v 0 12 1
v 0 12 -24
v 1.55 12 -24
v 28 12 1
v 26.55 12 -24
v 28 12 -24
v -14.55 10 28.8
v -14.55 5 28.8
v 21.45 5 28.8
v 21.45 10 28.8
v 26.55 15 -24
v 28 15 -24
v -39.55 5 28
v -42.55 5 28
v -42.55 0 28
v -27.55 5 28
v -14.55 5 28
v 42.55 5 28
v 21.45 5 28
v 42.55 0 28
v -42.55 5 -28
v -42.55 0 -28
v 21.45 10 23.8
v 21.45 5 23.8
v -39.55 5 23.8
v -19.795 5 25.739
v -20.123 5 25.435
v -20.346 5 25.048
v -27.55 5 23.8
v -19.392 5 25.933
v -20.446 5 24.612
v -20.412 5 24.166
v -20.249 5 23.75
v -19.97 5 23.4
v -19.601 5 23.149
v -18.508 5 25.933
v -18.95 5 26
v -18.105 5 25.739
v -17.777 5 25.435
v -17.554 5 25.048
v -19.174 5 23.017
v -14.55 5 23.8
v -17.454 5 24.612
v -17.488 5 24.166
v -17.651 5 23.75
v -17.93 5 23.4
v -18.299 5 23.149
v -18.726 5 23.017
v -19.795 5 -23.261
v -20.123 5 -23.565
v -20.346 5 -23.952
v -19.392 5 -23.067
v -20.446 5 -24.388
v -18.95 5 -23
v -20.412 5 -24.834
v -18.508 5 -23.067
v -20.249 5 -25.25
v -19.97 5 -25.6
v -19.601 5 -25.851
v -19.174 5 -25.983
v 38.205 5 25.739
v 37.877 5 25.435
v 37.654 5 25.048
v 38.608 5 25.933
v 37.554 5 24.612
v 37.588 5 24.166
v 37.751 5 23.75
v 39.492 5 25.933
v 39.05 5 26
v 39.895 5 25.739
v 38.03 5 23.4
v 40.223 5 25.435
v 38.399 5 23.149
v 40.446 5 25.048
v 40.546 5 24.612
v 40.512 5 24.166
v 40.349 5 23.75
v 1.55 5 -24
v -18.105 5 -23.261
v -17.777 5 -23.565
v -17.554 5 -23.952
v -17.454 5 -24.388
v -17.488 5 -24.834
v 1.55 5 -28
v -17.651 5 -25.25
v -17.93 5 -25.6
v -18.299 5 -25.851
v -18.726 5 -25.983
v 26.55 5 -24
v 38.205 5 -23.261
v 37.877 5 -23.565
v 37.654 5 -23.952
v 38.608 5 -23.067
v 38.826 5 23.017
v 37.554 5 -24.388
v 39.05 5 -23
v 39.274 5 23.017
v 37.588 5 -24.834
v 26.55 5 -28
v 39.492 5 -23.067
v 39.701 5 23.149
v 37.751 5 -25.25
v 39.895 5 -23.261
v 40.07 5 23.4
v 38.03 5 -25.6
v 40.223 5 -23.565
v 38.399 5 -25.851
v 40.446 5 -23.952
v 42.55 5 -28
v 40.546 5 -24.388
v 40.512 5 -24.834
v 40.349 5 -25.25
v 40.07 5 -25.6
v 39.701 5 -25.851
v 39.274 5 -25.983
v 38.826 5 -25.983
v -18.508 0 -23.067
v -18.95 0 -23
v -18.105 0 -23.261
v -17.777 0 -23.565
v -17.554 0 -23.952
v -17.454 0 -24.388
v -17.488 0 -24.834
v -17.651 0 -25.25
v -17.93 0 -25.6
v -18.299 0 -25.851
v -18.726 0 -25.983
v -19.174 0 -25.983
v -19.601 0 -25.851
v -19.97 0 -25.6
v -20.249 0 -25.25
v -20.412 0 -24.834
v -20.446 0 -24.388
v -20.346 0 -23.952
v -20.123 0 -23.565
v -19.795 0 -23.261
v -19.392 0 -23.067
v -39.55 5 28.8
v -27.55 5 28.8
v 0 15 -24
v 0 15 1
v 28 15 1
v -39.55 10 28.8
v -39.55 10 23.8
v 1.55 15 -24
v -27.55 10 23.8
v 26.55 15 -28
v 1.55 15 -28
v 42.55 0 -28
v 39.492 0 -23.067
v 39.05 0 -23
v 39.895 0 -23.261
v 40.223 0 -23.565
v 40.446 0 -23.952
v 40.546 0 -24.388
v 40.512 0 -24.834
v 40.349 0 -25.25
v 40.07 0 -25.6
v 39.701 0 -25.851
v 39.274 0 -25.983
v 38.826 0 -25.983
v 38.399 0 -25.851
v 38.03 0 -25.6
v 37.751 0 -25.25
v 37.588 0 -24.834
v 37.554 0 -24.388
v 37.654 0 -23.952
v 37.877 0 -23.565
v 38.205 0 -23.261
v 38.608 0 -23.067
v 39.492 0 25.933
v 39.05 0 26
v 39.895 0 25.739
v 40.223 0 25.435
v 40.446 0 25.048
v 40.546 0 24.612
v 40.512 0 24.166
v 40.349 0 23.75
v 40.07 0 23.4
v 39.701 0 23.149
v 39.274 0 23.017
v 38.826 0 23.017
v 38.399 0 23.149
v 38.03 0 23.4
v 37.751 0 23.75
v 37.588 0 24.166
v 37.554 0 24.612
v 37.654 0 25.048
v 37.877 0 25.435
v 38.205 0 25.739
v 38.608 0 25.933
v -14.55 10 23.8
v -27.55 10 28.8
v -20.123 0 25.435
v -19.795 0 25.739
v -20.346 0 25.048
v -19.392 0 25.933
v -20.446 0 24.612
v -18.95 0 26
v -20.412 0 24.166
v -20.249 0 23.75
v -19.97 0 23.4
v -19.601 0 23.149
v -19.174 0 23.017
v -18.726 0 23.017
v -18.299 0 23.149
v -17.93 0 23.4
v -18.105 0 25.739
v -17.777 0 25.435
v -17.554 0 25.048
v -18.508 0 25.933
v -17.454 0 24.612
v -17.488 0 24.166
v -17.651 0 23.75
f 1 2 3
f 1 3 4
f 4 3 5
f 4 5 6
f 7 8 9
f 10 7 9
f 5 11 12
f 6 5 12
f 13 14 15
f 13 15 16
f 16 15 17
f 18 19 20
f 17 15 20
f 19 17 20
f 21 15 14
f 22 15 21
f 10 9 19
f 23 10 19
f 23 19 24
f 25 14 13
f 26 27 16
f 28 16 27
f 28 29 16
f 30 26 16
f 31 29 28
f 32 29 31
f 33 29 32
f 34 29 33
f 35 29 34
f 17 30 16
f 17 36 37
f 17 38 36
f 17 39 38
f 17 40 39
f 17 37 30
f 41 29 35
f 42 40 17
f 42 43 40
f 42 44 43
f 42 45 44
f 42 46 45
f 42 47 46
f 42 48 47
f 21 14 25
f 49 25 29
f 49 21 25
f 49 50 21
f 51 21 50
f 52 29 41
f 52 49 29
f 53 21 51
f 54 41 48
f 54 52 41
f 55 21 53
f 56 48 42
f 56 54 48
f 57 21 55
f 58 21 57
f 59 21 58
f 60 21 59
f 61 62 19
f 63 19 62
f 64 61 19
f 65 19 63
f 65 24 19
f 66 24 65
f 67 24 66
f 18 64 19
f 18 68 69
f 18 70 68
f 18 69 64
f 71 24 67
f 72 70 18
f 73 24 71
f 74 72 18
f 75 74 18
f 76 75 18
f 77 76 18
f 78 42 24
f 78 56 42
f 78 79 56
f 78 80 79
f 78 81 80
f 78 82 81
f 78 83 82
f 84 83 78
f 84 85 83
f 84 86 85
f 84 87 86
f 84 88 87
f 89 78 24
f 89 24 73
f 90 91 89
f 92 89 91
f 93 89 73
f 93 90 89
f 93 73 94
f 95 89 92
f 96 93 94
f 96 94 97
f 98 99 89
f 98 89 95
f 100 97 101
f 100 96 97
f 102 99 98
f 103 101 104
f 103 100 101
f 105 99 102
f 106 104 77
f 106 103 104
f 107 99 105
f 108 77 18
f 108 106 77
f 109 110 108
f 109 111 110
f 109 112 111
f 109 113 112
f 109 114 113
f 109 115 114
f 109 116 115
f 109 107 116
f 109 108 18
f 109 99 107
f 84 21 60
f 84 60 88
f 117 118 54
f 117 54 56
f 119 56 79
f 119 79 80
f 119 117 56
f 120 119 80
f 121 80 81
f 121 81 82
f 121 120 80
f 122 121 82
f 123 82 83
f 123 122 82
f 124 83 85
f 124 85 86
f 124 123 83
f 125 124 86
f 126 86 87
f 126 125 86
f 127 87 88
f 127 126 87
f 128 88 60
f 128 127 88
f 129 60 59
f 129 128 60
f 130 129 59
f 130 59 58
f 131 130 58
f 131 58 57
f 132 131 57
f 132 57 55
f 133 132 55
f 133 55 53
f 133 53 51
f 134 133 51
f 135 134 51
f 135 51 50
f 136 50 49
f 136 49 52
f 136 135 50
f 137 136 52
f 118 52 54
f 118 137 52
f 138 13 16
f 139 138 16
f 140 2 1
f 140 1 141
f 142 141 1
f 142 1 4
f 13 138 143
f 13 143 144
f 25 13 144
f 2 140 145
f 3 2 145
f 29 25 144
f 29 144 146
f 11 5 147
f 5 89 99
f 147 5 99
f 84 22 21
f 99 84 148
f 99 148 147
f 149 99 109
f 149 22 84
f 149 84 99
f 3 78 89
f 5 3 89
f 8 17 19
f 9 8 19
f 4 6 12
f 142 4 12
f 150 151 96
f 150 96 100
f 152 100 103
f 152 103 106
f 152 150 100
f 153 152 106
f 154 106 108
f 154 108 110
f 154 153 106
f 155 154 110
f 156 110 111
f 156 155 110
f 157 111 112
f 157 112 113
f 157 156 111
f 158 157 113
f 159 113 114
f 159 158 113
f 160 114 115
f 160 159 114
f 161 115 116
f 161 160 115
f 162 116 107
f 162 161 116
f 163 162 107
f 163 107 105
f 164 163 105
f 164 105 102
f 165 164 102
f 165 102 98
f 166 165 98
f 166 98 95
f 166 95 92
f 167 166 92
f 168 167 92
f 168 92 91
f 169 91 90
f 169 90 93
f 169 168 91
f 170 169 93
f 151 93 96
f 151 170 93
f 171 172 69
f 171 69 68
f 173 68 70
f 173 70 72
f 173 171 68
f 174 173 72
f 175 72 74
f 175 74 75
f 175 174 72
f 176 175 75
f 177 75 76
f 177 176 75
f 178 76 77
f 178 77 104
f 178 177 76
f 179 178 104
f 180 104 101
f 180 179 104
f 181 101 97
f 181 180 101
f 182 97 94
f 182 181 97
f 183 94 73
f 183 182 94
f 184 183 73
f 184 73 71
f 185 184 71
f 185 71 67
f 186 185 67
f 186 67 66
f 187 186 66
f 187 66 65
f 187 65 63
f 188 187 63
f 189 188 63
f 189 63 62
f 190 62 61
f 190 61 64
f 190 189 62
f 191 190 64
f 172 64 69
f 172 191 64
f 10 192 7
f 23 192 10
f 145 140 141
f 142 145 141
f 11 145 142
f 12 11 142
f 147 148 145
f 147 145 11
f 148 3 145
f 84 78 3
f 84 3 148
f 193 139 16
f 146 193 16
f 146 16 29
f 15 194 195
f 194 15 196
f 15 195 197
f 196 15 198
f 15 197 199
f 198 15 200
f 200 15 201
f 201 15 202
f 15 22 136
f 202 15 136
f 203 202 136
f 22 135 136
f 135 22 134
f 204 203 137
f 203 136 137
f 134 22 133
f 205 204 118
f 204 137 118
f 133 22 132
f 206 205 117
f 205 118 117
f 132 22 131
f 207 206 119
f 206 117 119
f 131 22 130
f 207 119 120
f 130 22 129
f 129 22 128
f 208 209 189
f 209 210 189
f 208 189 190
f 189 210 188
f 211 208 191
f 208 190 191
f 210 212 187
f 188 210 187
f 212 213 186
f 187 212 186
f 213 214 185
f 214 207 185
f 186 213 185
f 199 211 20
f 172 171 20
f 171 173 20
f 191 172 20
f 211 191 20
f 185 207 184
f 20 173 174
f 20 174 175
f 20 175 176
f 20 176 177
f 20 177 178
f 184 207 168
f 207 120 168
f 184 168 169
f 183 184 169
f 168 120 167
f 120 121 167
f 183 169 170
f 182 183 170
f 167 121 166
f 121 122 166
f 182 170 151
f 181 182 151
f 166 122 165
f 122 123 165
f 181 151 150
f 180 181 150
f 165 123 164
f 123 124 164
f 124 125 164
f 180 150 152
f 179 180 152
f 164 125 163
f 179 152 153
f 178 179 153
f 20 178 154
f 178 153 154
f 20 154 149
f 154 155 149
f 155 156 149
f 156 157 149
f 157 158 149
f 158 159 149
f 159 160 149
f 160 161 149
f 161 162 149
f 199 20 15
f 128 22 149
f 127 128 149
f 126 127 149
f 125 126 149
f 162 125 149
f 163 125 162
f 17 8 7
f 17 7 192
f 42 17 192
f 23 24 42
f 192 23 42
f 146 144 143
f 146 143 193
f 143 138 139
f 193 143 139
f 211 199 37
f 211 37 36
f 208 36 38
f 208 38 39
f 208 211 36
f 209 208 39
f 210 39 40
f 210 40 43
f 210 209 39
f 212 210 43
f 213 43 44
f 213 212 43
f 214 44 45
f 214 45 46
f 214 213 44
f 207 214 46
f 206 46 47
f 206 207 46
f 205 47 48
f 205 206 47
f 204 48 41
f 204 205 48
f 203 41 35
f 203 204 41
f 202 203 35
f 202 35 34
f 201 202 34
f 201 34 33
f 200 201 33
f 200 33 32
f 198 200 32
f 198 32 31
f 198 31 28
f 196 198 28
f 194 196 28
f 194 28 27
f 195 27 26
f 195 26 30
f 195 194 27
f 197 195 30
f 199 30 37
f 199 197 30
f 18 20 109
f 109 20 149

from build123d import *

# Parameters (mm, degrees)
SKETCH1_W           = 85.1
SKETCH1_H           = 56
SKETCH1_R           = 1.5
BOSS_EXTRUDE1_DEPTH = 5
SKETCH3_W           = 12
SKETCH3_H           = 5
BOSS_EXTRUDE2_DEPTH = 5
SKETCH4_W           = 25
SKETCH4_H           = 4
BOSS_EXTRUDE3_DEPTH = 10
SKETCH5_W           = 28
SKETCH5_H           = 3
BOSS_EXTRUDE4_DEPTH = 25


with BuildPart() as part:
    # Sketch1 → Boss-Extrude1 (new body)
    with BuildSketch(Plane(origin=(0, 0, 0), x_dir=(1, 0, 0), z_dir=(0, 1, 0))):
        Rectangle(SKETCH1_W, SKETCH1_H)
        with Locations(Location((-18.95, -24.5, 0), (0, 0, 270))):
            Circle(SKETCH1_R, mode=Mode.SUBTRACT)
        with Locations(Location((39.05, -24.5, 0), (0, 0, 270))):
            Circle(SKETCH1_R, mode=Mode.SUBTRACT)
        with Locations(Location((39.05, 24.5, 0), (0, 0, 270))):
            Circle(SKETCH1_R, mode=Mode.SUBTRACT)
        with Locations(Location((-18.95, 24.5, 0), (0, 0, 270))):
            Circle(SKETCH1_R, mode=Mode.SUBTRACT)
    extrude(amount=BOSS_EXTRUDE1_DEPTH)

    # Sketch3 → Boss-Extrude2 (add)
    with BuildSketch(Plane(origin=(0, 5, 0), x_dir=(1, 0, 0), z_dir=(0, 1, 0))):
        with Locations((-33.55, -26.3)):
            Rectangle(SKETCH3_W, SKETCH3_H)
        with Locations((-8.55, -26.3)):
            Rectangle(SKETCH3_W, SKETCH3_H)
        with Locations((3.45, -26.3)):
            Rectangle(SKETCH3_W, SKETCH3_H)
        with Locations((15.45, -26.3)):
            Rectangle(SKETCH3_W, SKETCH3_H)
    extrude(amount=BOSS_EXTRUDE2_DEPTH)

    # Sketch4 → Boss-Extrude3 (add)
    with BuildSketch(Plane(origin=(0, 5, 0), x_dir=(1, 0, 0), z_dir=(0, 1, 0))):
        with Locations((14.05, 26)):
            Rectangle(SKETCH4_W, SKETCH4_H)
    extrude(amount=BOSS_EXTRUDE3_DEPTH)

    # Sketch5 → Boss-Extrude4 (add)
    with BuildSketch(Plane.XY.offset(-24)):
        with Locations((14, 13.5)):
            Rectangle(SKETCH5_W, SKETCH5_H)
    extrude(amount=BOSS_EXTRUDE4_DEPTH)


solid = part.part
